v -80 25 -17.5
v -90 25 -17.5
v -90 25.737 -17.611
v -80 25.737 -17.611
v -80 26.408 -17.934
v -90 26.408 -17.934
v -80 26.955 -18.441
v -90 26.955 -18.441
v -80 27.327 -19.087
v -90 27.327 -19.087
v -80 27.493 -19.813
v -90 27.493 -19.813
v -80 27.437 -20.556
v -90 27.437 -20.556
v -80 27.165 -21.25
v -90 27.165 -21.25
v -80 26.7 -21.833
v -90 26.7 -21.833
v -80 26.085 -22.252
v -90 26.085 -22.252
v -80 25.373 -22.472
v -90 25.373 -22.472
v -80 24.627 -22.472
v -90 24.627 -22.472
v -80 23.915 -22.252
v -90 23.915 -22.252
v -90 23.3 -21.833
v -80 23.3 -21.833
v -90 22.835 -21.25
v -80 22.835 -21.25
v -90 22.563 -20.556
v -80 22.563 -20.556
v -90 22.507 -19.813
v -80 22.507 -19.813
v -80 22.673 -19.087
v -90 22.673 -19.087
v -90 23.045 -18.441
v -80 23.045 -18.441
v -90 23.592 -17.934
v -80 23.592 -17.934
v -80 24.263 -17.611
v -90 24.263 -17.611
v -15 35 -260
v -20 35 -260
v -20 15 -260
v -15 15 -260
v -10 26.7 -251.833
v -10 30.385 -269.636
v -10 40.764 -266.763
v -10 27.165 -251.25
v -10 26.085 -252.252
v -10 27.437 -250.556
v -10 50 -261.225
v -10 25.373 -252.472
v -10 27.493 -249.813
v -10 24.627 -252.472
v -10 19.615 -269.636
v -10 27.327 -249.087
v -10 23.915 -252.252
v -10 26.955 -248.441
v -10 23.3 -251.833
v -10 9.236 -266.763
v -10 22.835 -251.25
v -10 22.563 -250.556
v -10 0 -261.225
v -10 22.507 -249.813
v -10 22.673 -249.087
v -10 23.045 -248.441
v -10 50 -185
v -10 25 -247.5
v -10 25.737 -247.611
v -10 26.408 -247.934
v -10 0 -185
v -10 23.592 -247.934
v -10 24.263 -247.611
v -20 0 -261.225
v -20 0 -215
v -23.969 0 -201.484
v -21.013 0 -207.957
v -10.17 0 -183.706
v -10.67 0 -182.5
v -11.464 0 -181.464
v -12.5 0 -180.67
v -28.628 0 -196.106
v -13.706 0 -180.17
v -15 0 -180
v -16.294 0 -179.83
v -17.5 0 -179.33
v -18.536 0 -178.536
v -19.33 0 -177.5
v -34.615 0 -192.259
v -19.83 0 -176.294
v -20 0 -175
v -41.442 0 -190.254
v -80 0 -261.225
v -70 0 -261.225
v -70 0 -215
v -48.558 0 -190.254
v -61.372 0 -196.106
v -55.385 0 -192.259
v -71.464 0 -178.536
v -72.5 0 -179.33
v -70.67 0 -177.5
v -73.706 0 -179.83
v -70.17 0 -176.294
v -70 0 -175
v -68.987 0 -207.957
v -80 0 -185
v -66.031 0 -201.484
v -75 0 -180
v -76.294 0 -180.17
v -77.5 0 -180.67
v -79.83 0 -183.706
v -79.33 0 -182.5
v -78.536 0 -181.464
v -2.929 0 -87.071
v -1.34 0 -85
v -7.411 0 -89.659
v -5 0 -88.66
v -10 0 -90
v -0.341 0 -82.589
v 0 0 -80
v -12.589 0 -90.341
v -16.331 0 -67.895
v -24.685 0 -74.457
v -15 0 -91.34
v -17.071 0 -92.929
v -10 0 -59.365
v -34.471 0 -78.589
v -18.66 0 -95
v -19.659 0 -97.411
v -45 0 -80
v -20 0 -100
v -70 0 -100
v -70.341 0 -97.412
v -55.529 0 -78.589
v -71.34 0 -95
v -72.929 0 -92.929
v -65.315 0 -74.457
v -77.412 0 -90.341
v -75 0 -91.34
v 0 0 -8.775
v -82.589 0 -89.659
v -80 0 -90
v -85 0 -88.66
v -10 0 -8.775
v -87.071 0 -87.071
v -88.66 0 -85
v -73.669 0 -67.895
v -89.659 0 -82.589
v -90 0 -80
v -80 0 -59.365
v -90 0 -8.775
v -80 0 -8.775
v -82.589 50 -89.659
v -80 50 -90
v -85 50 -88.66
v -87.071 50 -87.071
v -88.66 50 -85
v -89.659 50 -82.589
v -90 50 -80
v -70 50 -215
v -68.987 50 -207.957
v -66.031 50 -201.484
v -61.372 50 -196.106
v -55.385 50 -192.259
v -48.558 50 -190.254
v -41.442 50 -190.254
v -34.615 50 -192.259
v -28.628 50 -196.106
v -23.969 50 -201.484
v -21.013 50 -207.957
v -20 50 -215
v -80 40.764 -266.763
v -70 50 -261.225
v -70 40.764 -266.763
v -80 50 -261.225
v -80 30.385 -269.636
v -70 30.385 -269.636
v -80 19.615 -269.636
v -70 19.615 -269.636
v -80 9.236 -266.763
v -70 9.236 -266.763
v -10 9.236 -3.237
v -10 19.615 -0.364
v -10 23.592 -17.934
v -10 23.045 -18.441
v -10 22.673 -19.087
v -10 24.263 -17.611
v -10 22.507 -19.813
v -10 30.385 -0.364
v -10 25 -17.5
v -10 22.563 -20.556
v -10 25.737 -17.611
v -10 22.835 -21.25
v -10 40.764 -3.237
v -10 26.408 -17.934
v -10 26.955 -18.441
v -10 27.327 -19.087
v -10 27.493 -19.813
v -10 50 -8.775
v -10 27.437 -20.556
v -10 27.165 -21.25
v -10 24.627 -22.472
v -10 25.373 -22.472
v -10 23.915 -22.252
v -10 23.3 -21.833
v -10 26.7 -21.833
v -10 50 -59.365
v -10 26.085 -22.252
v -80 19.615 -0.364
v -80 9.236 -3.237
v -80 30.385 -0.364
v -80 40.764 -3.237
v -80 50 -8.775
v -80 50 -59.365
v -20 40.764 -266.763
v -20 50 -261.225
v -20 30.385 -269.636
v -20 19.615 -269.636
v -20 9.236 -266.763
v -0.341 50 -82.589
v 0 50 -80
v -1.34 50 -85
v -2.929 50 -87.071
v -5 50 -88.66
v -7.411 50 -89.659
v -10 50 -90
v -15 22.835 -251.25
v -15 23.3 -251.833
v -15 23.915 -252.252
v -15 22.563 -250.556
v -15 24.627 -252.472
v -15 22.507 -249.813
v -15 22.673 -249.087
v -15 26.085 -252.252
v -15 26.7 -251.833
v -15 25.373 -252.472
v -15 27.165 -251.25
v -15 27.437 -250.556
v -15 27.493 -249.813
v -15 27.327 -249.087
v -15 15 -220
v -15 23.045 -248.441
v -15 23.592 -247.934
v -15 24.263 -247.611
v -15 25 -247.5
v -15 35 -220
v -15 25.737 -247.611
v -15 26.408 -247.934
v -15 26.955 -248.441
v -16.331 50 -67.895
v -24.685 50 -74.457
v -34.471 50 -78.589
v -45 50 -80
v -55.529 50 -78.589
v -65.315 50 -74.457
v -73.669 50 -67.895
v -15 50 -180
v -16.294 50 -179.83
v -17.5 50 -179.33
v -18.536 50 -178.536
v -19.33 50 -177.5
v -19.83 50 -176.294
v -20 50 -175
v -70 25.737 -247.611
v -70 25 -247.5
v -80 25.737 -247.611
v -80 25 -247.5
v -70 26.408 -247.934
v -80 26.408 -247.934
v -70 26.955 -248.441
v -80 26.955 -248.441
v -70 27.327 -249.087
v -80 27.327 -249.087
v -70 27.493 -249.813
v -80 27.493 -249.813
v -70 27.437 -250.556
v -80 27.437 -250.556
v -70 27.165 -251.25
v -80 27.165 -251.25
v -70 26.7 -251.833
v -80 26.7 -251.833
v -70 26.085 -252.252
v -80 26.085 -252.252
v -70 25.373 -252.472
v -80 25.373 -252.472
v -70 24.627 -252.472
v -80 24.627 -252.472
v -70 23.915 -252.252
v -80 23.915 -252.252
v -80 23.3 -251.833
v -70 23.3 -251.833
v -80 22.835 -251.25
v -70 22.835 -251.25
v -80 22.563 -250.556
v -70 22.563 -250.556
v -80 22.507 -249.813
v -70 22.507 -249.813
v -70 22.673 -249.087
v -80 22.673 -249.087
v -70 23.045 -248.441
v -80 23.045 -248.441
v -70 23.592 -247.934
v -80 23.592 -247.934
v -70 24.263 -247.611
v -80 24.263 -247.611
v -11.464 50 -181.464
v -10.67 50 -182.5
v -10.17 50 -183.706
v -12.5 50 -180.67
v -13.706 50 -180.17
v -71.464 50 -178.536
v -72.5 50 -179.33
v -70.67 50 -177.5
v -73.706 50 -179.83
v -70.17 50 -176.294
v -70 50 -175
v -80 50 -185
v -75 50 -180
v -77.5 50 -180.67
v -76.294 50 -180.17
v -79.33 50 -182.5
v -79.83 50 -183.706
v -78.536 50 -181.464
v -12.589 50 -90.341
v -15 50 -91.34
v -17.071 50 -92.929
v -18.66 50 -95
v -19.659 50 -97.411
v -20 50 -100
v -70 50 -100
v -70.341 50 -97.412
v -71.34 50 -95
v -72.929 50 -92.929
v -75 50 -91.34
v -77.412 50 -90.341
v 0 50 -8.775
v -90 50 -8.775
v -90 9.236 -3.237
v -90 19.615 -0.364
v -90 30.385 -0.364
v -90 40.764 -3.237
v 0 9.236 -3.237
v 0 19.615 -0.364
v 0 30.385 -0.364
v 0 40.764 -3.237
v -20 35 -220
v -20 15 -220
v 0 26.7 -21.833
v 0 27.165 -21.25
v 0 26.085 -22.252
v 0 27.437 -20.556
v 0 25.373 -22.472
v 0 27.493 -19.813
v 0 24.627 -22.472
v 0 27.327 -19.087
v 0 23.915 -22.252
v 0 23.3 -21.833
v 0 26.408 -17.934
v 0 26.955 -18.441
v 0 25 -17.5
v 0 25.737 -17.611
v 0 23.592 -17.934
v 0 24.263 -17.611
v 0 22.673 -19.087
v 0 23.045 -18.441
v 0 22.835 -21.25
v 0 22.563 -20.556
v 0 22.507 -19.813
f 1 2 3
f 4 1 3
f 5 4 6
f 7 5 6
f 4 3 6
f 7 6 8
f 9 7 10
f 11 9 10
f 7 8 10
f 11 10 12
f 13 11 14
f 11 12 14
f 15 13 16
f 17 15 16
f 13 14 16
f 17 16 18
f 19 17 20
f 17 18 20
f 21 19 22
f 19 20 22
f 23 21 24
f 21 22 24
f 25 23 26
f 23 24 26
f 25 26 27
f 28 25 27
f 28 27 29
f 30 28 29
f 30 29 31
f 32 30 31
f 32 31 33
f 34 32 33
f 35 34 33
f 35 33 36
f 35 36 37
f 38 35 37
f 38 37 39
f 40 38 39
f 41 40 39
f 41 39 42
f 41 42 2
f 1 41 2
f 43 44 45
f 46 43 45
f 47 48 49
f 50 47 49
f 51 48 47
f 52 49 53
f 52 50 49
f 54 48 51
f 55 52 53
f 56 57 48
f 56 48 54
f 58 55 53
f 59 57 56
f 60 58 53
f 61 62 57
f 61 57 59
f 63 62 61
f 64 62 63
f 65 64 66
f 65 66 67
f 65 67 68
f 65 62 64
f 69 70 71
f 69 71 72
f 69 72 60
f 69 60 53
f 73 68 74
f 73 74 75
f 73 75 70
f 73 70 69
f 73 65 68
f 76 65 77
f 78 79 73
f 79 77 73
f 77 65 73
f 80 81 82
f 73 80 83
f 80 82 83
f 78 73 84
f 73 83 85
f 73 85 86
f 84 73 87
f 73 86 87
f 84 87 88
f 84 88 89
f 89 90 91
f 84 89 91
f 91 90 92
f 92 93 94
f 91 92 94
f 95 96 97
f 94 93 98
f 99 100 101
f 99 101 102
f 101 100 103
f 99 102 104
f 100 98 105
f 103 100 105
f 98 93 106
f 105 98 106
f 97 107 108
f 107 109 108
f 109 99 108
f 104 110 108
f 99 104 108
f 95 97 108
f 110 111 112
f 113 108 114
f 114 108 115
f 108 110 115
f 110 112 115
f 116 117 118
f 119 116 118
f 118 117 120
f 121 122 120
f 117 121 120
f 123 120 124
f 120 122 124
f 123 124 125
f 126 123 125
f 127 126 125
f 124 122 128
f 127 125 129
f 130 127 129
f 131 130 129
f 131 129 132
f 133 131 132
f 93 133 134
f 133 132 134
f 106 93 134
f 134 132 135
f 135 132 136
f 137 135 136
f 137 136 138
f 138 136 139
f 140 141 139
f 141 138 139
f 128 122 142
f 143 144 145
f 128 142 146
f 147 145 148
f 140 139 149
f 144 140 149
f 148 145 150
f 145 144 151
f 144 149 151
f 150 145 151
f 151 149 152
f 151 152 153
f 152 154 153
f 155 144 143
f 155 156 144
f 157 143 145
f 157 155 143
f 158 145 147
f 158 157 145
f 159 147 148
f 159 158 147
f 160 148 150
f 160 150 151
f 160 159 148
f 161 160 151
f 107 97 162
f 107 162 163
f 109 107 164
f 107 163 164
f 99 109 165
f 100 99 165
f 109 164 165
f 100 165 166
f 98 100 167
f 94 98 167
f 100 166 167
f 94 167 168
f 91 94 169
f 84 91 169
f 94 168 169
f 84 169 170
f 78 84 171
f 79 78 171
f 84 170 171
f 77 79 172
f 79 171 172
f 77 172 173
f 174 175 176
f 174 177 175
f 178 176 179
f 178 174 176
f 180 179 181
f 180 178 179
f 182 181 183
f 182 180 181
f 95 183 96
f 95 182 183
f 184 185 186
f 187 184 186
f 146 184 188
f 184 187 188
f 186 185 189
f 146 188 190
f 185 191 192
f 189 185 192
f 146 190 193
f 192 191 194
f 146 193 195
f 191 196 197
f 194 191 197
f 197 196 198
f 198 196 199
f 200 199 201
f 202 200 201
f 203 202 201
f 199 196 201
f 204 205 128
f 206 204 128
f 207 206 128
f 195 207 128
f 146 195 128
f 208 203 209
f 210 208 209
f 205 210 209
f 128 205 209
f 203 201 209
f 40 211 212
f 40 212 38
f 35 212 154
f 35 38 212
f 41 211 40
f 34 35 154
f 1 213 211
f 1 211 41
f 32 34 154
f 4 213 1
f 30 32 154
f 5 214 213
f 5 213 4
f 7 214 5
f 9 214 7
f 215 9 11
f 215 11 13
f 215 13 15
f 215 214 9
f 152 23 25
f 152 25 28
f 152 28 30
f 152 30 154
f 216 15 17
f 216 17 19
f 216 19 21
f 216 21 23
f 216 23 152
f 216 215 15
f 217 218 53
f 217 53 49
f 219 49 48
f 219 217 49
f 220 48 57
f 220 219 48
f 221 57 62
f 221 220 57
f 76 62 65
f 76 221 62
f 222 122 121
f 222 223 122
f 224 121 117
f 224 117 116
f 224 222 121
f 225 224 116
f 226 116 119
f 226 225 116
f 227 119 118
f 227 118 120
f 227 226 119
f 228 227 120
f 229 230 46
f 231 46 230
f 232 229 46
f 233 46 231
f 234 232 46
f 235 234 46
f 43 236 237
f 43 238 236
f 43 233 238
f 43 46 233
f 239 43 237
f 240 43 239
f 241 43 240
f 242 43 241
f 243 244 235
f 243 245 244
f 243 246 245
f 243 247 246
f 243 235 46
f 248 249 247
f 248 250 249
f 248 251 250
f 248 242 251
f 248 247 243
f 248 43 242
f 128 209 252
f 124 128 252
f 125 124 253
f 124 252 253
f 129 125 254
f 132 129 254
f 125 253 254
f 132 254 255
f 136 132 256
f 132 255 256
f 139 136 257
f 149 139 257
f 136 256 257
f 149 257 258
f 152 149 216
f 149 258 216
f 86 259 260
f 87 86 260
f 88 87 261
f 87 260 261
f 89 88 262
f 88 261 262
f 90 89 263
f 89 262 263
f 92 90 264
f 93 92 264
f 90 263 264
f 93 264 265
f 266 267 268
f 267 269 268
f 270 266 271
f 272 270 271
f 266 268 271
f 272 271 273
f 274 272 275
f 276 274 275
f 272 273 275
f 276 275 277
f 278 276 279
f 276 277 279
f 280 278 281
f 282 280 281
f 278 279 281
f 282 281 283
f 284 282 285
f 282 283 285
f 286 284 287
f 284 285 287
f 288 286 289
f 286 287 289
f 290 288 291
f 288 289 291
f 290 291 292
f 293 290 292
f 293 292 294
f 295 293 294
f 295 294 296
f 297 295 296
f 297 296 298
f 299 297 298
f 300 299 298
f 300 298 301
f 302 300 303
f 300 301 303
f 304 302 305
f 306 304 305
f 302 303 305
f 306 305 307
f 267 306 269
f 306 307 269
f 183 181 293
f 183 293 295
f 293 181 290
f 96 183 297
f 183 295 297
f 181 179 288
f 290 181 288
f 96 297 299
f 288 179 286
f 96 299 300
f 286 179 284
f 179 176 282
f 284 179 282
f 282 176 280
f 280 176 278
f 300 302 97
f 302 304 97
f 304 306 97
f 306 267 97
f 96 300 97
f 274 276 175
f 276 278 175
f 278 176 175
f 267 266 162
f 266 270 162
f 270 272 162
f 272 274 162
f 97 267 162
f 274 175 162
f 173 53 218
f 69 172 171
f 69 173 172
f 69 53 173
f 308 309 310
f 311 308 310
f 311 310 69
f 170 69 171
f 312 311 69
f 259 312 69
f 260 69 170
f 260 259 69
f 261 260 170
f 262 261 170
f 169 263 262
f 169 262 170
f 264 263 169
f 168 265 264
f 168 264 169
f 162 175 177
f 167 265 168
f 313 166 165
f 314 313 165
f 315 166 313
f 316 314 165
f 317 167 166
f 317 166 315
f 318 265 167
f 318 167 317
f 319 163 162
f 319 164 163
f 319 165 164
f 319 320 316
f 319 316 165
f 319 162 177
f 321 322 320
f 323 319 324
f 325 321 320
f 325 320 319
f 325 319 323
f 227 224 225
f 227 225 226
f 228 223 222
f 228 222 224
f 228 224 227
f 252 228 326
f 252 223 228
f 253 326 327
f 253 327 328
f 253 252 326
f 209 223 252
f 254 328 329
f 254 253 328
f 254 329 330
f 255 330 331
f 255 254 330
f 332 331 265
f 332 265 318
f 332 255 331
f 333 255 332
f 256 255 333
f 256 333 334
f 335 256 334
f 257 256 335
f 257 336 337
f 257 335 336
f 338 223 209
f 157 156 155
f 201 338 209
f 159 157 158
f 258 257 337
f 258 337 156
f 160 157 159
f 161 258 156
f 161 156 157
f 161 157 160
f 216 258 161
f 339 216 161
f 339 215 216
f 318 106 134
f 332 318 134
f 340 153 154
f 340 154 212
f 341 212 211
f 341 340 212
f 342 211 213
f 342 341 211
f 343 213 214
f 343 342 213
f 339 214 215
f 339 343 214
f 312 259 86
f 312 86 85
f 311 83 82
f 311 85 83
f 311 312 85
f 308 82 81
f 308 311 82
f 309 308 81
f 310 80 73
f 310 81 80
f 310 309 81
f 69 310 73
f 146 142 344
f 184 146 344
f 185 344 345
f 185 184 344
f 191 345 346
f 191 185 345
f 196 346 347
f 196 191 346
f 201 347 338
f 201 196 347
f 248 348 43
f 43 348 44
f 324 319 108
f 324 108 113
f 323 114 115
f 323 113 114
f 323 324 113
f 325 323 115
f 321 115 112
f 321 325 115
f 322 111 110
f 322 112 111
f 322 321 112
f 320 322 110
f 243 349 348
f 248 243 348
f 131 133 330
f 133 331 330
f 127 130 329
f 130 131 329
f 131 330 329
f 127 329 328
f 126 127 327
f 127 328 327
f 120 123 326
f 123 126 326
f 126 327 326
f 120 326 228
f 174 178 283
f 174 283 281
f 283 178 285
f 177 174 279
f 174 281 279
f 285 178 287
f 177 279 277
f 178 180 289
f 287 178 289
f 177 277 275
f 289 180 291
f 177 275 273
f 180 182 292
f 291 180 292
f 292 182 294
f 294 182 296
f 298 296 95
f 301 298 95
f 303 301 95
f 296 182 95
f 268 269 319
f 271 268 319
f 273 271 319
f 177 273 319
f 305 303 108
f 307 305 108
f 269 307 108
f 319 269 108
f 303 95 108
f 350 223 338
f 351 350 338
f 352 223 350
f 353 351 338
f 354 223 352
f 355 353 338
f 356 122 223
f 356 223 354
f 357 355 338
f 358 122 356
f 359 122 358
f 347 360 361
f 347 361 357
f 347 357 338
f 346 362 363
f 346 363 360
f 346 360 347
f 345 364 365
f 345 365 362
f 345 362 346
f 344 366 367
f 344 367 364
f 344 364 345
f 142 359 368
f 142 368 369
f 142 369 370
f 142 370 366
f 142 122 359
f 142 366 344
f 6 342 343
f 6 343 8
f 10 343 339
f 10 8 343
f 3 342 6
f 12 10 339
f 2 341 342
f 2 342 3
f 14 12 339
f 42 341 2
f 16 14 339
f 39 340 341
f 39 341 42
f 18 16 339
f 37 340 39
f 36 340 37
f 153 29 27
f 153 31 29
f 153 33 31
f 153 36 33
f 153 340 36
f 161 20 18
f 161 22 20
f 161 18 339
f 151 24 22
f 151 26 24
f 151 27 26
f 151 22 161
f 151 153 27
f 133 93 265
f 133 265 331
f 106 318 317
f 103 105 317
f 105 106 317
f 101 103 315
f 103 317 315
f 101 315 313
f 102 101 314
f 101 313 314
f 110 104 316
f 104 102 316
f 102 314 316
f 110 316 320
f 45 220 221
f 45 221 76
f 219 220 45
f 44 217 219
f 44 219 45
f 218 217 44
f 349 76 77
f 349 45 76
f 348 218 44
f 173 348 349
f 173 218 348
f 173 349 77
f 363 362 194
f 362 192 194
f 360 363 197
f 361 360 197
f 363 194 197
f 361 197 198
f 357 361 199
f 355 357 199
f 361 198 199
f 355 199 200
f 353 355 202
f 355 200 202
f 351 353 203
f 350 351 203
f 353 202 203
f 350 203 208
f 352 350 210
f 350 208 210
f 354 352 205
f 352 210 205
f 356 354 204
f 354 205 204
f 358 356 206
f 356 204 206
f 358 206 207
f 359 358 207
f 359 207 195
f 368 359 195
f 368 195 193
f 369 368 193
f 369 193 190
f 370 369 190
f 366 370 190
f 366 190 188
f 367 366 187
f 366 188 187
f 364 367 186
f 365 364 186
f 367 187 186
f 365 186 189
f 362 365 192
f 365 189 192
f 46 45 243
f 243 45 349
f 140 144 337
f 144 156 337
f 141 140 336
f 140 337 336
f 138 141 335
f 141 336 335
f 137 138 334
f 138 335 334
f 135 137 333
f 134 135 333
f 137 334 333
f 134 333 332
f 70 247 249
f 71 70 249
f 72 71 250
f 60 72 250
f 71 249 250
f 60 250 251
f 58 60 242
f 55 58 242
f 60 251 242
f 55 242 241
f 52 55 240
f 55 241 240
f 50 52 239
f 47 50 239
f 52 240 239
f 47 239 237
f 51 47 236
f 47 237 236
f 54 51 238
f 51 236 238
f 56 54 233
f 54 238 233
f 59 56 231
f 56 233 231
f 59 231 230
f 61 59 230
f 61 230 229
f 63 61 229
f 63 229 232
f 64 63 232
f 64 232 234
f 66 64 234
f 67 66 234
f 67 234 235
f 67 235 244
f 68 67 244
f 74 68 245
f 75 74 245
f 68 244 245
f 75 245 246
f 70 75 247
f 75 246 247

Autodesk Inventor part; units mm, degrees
ref_plane "YZ Plane" through (0, 0, 0) normal (1, 0, 0) x (0, 1, 0)
ref_plane "XZ Plane" through (0, 0, 0) normal (0, 1, 0) x (-1, 0, 0)
ref_plane "XY Plane" through (0, 0, 0) normal (0, 0, 1) x (1, 0, 0)
sketch "Sketch1" plane through (0, 0, 0) normal (0, 1, 0) x (-1, 0, 0)
  line L0 (90, 0) -> (90, -90)
  line L1 (0, -90) -> (0, 0)
  line L2 (90, 0) -> (90, -90)
  line L3 (90, -90) -> (0, -90)
  line L4 (10, -180) -> (80, -180)
  line L5 (90, 0) -> (80, 0)
  line L6 (80, 0) -> (80, -90)
  line L7 (0, 0) -> (10, 0)
  line L8 (10, 0) -> (10, -90)
  line L9 (80, -270) -> (80, -180)
  line L10 (10, -270) -> (10, -180)
  line L11 (80, -270) -> (70, -270)
  line L12 (70, -270) -> (70, -180)
  line L13 (10, -270) -> (20, -270)
  line L14 (20, -270) -> (20, -180)
  line L15 (80, -90) -> (70, -90)
  line L16 (70, -180) -> (60, -180)
  line L17 (20, -180) -> (30, -180)
  line L18 (70, -180) -> (70, -90)
  line L19 (20, -180) -> (20, -90)
  line L20 (80, -270) -> (70, -270)
  line L21 (20, -270) -> (10, -270)
  line L22 (0, 0) -> (10, 0)
  line L23 (80, 0) -> (90, 0)
  line L24 (90, 0) -> (80, 0)
  line L25 (0, 0) -> (10, 0)
  line L26 (90, 0) -> (0, 0)
  line L27 (80, -270) -> (10, -270)
  dimension "d2" = 90
  dimension "d4" = 10
  dimension "d5" = 10
extrude "Extrusion1" add sketch "Sketch1" along normal blind 50
sketch "Sketch2" plane through (0, 50, 0) normal (0, 1, 0) x (1, 0, 0)
  arc A0 (-10, 59.3649) -> (-80, 59.3649) centre (-45, 40) ccw
  line L0 (-90, 0) -> (0, 0) projected
  line L1 (-90, 0) -> (-80, 0)
  line L2 (-80, 0) -> (-80, 59.3649)
  line L3 (0, 0) -> (-10, 0)
  line L4 (-10, 0) -> (-10, 59.3649)
  line L5 (-80, 0) -> (-10, 0)
  line L6 (-80, 270) -> (-80, 180) projected
  line L7 (-70, 270) -> (-20, 270)
  line L8 (-80, 180) -> (-80, 190)
  line L9 (-10, 180) -> (-10, 270) projected
  line L10 (-70, 270) -> (-70, 215)
  line L11 (-20, 270) -> (-20, 215)
  arc A1 (-70, 215) -> (-20, 215) centre (-45, 215) ccw
  point P0 (-90, 90)
  dimension "d18" = 10
  dimension "d19" = 10
  dimension "d25" = 10
extrude "Extrusion2" cut sketch "Sketch2" against normal blind 50
fillet "Fillet1" radius 10 1 edges at (-70, 25, -90)
fillet "Fillet2" radius 10 1 edges at (-90, 25, -90)
fillet "Fillet3" radius 10 2 edges at (-20, 25, -90) (0, 25, -90)
fillet "Fillet4" radius 5 1 edges at (-80, 25, -180)
fillet "Fillet5" radius 5 3 edges at (-70, 25, -180) (-10, 25, -180) (-20, 25, -180)
sketch "Sketch3" plane through (-90, 0, 0) normal (-1, 0, 0) x (0, 0, 1)
  line L0 (0, 0) -> (0, 50) projected
  circle A0 centre (-20, 25) radius 2.5
  arc A1 (-8.775, 0) -> (-8.775, 50) centre (-40, 25) ccw
  line L1 (-80, 0) -> (-90, 0) projected
  line L2 (-8.775, 0) -> (0, 0)
  line L3 (0, 0) -> (0, 50)
  line L4 (0, 50) -> (-8.775, 50)
  line L5 (-270, 0) -> (-270, 50) projected
  circle A2 centre (-250, 25) radius 2.5
  line L6 (-270, 50) -> (-270, 0)
  arc A3 (-261.225, 50) -> (-261.225, 0) centre (-230, 25) ccw
  line L7 (-270, 0) -> (-261.225, 0)
  line L8 (-185, 0) -> (-270, 0) projected
  line L9 (-270, 50) -> (-261.225, 50)
  line L10 (-270, 50) -> (-185, 50) projected
  point P0 (0, 25)
  point P1 (-270, 25)
  dimension "d36" = 5
  dimension "d40" = 5
extrude "Extrusion3" cut sketch "Sketch3" against normal blind 150.25
sketch "Sketch4" plane through (-20, 0, -215) normal (-1, 0, 0) x (0, 0, 1)
  circle A0 centre (-35, 25) radius 2.5 projected
  line L0 (-45, 25) -> (-45, 32.5)
  line L1 (-45, 32.5) -> (-15, 32.5)
  line L2 (-15, 32.5) -> (-15, 17.5)
  line L3 (-15, 17.5) -> (-45, 17.5)
  line L4 (-45, 25) -> (-45, 17.5)
  point P0 (215, 0)
  dimension "d43" = 10
  dimension "d44" = 7.5
  dimension "d45" = 30
  dimension "d47" = 15
extrude "Extrusion4" cut sketch "Sketch4" against normal blind 5
sketch "Sketch5" plane through (-20, 0, -215) normal (-1, 0, 0) x (0, 0, 1)
  line L0 (-45, 17.5) -> (-45, 32.5) projected
  line L1 (-45, 32.5) -> (-45, 35)
  line L2 (-15, 17.5) -> (-45, 17.5) projected
  line L3 (-45, 17.5) -> (-45, 15)
  line L4 (-45, 15) -> (-5, 15)
  line L5 (-5, 15) -> (-5, 35)
  line L6 (-5, 35) -> (-45, 35)
  line L7 (-45, 17.5) -> (-45, 32.5)
  point P0 (215, 0)
  dimension "d50" = 2.5
  dimension "d51" = 2.5
  dimension "d52" = 40
  dimension "d53" = 20
extrude "Extrusion5" cut sketch "Sketch5" against normal blind 5
properties part number "PartArmNEW"
